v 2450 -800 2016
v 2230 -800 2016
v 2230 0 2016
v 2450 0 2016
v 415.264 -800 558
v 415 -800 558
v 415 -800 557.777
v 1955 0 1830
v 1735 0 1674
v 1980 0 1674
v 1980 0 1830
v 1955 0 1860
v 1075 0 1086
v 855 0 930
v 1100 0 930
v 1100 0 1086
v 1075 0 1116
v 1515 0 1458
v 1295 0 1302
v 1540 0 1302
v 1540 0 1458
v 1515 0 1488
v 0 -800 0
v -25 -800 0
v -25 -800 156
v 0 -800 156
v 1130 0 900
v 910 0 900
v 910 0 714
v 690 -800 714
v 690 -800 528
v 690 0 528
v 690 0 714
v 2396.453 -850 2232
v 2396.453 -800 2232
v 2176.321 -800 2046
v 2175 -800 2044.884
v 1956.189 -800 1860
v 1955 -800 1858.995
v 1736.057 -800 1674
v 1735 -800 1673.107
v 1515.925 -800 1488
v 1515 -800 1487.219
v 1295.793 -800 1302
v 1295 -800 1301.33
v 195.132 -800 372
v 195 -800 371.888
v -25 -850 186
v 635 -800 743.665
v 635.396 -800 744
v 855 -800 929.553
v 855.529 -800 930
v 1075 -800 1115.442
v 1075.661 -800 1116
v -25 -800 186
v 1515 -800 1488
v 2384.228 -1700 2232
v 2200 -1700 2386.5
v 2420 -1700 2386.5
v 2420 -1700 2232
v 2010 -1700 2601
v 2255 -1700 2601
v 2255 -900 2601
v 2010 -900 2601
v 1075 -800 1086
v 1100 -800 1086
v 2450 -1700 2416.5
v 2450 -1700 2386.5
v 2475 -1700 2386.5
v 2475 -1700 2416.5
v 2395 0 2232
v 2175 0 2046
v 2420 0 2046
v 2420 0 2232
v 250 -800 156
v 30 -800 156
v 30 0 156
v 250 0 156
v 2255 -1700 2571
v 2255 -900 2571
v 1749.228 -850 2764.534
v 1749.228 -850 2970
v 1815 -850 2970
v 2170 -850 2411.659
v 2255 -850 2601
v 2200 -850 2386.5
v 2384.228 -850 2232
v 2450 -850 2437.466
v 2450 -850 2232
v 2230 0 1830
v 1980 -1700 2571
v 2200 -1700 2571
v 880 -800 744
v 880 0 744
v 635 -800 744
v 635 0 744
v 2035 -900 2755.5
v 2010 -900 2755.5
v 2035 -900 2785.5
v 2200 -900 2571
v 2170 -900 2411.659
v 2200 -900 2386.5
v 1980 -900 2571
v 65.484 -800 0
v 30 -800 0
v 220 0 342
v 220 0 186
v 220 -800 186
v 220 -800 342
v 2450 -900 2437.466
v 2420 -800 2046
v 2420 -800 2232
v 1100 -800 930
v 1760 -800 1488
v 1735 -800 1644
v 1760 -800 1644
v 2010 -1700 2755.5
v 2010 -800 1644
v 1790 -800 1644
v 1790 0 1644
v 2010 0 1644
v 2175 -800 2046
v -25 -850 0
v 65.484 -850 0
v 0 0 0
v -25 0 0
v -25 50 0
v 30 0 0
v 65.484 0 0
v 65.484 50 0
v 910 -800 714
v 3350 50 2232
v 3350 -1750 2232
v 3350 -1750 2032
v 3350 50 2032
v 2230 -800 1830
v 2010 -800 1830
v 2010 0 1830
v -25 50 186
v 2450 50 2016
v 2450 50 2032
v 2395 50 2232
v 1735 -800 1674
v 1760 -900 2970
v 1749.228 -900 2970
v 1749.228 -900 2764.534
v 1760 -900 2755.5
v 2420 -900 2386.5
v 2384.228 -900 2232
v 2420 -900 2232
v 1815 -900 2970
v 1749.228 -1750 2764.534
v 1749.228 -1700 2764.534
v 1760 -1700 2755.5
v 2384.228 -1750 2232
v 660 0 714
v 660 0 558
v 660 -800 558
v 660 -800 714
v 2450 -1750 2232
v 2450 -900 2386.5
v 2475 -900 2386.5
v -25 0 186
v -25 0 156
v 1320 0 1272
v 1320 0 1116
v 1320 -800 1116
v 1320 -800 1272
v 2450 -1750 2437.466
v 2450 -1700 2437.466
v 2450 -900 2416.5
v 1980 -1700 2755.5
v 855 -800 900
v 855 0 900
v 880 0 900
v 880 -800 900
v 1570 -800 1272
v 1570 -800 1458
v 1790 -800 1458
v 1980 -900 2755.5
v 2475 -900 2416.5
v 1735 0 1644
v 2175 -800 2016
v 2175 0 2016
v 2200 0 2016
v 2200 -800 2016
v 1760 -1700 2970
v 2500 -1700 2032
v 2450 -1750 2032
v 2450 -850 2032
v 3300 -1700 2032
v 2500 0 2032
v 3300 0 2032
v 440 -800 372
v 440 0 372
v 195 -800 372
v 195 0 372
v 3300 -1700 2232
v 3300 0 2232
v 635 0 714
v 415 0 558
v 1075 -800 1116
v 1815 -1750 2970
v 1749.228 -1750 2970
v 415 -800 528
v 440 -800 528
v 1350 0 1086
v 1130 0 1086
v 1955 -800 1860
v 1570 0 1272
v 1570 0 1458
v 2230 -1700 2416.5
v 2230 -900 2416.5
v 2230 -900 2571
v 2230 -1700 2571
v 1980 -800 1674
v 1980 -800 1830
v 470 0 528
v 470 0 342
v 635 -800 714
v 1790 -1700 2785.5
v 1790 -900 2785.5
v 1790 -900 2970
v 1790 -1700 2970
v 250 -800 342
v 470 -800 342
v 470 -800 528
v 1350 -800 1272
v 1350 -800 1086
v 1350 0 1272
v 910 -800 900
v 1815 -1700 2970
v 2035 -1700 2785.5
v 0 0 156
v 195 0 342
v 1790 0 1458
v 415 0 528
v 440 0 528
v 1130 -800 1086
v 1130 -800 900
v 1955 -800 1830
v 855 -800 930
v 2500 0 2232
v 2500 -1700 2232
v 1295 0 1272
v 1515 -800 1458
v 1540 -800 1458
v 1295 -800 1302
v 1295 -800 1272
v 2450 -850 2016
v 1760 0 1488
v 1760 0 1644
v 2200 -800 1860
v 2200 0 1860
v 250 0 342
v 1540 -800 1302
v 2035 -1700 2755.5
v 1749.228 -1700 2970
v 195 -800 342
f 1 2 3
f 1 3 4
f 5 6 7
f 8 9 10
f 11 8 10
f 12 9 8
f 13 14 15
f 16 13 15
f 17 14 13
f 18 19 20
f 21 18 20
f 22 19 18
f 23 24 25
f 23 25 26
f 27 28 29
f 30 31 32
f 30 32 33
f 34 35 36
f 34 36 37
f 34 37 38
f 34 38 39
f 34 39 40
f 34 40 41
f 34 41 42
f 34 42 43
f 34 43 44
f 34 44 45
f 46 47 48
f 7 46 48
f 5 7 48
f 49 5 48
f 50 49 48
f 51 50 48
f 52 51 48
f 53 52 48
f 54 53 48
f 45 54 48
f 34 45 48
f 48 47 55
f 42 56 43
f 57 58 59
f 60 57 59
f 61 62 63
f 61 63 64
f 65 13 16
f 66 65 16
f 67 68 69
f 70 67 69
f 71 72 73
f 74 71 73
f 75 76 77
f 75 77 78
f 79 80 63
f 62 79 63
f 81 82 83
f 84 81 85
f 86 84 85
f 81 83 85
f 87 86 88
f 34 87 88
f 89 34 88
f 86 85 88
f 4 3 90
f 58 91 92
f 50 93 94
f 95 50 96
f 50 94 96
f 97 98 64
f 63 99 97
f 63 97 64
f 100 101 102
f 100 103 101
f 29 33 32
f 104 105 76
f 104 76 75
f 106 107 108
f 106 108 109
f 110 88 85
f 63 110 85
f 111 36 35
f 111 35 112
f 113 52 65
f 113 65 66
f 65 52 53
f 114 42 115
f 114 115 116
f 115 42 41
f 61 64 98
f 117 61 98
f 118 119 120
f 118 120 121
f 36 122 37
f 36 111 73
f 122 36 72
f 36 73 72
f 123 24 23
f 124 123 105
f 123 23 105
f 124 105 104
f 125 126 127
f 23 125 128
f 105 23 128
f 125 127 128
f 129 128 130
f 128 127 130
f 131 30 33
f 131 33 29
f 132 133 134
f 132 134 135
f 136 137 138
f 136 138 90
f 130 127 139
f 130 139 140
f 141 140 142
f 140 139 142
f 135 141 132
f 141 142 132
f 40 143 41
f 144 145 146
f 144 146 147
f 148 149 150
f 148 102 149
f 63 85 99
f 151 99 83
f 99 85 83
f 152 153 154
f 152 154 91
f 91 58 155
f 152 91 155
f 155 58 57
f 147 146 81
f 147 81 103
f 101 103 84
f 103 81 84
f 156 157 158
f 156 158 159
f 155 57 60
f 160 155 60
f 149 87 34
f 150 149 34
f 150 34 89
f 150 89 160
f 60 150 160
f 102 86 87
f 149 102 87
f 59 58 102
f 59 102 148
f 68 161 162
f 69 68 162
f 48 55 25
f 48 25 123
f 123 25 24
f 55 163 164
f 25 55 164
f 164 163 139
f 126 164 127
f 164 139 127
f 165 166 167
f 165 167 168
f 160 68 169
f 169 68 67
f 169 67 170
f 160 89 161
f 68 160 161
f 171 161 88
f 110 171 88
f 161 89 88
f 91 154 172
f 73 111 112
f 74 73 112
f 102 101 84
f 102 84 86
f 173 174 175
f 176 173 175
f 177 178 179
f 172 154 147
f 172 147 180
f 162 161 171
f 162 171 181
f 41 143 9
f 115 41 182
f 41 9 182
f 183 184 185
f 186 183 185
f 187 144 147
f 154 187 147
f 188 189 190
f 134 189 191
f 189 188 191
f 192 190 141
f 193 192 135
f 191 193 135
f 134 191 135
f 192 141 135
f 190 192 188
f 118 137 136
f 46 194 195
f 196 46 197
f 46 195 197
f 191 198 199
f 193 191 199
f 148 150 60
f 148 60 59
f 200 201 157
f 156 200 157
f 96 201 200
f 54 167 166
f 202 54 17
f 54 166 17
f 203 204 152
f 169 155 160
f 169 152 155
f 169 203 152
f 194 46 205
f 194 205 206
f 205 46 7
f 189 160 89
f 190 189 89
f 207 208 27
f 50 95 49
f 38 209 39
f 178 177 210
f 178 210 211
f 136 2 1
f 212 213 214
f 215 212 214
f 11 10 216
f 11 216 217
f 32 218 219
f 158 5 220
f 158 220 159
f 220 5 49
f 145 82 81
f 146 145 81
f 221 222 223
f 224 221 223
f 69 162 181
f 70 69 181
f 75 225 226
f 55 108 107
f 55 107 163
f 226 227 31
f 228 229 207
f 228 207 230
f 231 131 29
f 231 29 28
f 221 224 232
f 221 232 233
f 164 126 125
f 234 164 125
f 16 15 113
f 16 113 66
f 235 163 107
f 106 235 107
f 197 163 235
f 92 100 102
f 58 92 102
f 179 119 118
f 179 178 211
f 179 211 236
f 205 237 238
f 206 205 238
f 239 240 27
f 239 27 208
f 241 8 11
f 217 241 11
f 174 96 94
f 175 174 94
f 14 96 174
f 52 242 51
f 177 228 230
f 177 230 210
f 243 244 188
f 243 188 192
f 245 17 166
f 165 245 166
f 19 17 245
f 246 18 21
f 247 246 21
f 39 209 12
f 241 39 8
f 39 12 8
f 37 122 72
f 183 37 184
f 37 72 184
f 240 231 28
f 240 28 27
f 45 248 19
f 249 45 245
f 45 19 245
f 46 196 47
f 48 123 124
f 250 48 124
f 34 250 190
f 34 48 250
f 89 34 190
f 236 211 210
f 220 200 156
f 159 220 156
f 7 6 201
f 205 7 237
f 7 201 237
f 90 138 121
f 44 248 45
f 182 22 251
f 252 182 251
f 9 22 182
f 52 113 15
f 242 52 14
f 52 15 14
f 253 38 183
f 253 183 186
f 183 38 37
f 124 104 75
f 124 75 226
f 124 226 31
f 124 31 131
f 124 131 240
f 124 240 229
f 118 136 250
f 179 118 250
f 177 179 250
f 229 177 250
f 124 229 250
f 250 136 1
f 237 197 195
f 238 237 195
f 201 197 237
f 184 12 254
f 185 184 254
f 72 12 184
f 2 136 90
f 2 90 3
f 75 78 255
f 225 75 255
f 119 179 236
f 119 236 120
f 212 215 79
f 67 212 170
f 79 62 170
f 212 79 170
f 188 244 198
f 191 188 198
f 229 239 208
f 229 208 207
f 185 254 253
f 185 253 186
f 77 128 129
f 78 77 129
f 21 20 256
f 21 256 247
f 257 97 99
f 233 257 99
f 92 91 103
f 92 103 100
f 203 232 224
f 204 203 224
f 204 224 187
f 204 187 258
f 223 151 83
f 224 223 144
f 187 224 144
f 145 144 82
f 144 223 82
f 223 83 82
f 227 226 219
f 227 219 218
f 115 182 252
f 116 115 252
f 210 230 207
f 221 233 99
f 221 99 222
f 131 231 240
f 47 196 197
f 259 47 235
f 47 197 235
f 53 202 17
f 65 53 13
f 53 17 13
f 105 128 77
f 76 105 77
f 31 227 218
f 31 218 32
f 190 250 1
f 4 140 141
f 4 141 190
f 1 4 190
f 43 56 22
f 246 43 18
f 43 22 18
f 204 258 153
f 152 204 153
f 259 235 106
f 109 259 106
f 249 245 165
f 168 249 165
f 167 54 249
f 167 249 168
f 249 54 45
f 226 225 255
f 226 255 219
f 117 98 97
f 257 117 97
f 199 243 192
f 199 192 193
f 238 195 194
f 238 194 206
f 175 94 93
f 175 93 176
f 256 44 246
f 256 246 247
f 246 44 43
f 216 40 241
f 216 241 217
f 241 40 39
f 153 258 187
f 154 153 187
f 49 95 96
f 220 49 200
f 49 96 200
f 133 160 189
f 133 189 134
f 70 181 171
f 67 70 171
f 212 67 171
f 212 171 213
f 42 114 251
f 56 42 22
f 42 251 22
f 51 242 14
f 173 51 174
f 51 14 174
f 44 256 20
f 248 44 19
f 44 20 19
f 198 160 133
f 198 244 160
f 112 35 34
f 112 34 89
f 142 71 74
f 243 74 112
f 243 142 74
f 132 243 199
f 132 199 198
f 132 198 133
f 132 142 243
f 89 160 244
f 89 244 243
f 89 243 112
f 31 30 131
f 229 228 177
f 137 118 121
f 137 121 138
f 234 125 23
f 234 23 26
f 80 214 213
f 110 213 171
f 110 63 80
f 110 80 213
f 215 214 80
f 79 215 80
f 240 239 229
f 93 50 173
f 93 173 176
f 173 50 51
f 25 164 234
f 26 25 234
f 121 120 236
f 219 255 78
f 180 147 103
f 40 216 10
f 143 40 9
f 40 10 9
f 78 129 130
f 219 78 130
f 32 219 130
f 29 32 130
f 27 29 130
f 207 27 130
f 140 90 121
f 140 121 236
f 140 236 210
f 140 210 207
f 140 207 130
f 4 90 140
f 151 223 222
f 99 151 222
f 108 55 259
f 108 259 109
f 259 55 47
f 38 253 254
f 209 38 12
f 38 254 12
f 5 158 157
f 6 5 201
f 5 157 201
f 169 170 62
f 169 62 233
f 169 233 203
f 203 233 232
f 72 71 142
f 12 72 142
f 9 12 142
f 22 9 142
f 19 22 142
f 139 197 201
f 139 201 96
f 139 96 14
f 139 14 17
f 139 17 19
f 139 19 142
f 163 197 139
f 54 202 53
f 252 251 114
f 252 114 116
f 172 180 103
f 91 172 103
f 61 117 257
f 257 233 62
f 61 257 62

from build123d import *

# Parameters (mm, degrees)
F0_W      = 30
F0_H      = 156
F0_H_2    = 186
F3_DEPTH  = 800
F5_DEPTH  = 800
F6_DEPTH  = 50
F8_DEPTH  = 50
F9_W      = 900
F9_H      = 1800
F9_W_2    = 800
F9_H_2    = 1700
F10_DEPTH = 200
F12_DEPTH = 50
F13_W     = 30
F13_H     = 154.5
F13_H_2   = 184.5
F14_DEPTH = 800
F16_DEPTH = 50


with BuildPart() as f3:
    # F0 (on Front) → F3 (new body)
    with BuildSketch(Plane.XZ):
        with Locations((15, 78)):
            Rectangle(F0_W, F0_H)
        Polygon((-25, 156), (0, 156), (30, 156), (220, 156), (250, 156), (250, 186), (220, 186), (0, 186), (-25, 186), align=None)
        with Locations((235, 264)):
            Rectangle(F0_W, F0_H)
        Polygon((220, 342), (250, 342), (440, 342), (470, 342), (470, 372), (440, 372), (220, 372), (195, 372), (195, 342), align=None)
        with Locations((455, 450)):
            Rectangle(F0_W, F0_H)
        Polygon((440, 528), (470, 528), (660, 528), (690, 528), (690, 558), (660, 558), (440, 558), (415, 558), (415, 528), align=None)
        with Locations((675, 636)):
            Rectangle(F0_W, F0_H)
        Polygon((660, 714), (690, 714), (880, 714), (910, 714), (910, 744), (880, 744), (660, 744), (635, 744), (635, 714), align=None)
        with Locations((895, 822)):
            Rectangle(F0_W, F0_H)
        Polygon((880, 900), (910, 900), (1100, 900), (1130, 900), (1130, 930), (1100, 930), (880, 930), (855, 930), (855, 900), align=None)
        with Locations((1115, 1008)):
            Rectangle(F0_W, F0_H)
        Polygon((1100, 1086), (1130, 1086), (1320, 1086), (1350, 1086), (1350, 1116), (1320, 1116), (1100, 1116), (1075, 1116), (1075, 1086), align=None)
        with Locations((1335, 1194)):
            Rectangle(F0_W, F0_H)
        Polygon((1320, 1272), (1350, 1272), (1540, 1272), (1570, 1272), (1570, 1302), (1540, 1302), (1320, 1302), (1295, 1302), (1295, 1272), align=None)
        with Locations((1555, 1380)):
            Rectangle(F0_W, F0_H)
        Polygon((1540, 1458), (1570, 1458), (1760, 1458), (1790, 1458), (1790, 1488), (1760, 1488), (1540, 1488), (1515, 1488), (1515, 1458), align=None)
        with Locations((1775, 1566)):
            Rectangle(F0_W, F0_H)
        Polygon((1760, 1644), (1790, 1644), (1980, 1644), (2010, 1644), (2010, 1674), (1980, 1674), (1760, 1674), (1735, 1674), (1735, 1644), align=None)
        with Locations((1995, 1752)):
            Rectangle(F0_W, F0_H)
        Polygon((1980, 1830), (2010, 1830), (2200, 1830), (2230, 1830), (2230, 1860), (2200, 1860), (1980, 1860), (1955, 1860), (1955, 1830), align=None)
        with Locations((2215, 1938)):
            Rectangle(F0_W, F0_H)
        Polygon((2200, 2016), (2230, 2016), (2420, 2016), (2450, 2016), (2450, 2046), (2420, 2046), (2200, 2046), (2175, 2046), (2175, 2016), align=None)
        with Locations((2435, 2139)):
            Rectangle(F0_W, F0_H_2)
    extrude(amount=F3_DEPTH)

    # F0 (on Front) → F5 (join)
    with BuildSketch(Plane.XZ):
        with Locations((15, 78)):
            Rectangle(F0_W, F0_H)
        Polygon((-25, 156), (0, 156), (30, 156), (220, 156), (250, 156), (250, 186), (220, 186), (0, 186), (-25, 186), align=None)
        with Locations((235, 264)):
            Rectangle(F0_W, F0_H)
        Polygon((220, 342), (250, 342), (440, 342), (470, 342), (470, 372), (440, 372), (220, 372), (195, 372), (195, 342), align=None)
        with Locations((455, 450)):
            Rectangle(F0_W, F0_H)
        Polygon((440, 528), (470, 528), (660, 528), (690, 528), (690, 558), (660, 558), (440, 558), (415, 558), (415, 528), align=None)
        with Locations((675, 636)):
            Rectangle(F0_W, F0_H)
        Polygon((660, 714), (690, 714), (880, 714), (910, 714), (910, 744), (880, 744), (660, 744), (635, 744), (635, 714), align=None)
        with Locations((895, 822)):
            Rectangle(F0_W, F0_H)
        Polygon((880, 900), (910, 900), (1100, 900), (1130, 900), (1130, 930), (1100, 930), (880, 930), (855, 930), (855, 900), align=None)
        with Locations((1115, 1008)):
            Rectangle(F0_W, F0_H)
        Polygon((1100, 1086), (1130, 1086), (1320, 1086), (1350, 1086), (1350, 1116), (1320, 1116), (1100, 1116), (1075, 1116), (1075, 1086), align=None)
        with Locations((1335, 1194)):
            Rectangle(F0_W, F0_H)
        Polygon((1320, 1272), (1350, 1272), (1540, 1272), (1570, 1272), (1570, 1302), (1540, 1302), (1320, 1302), (1295, 1302), (1295, 1272), align=None)
        with Locations((1555, 1380)):
            Rectangle(F0_W, F0_H)
        Polygon((1540, 1458), (1570, 1458), (1760, 1458), (1790, 1458), (1790, 1488), (1760, 1488), (1540, 1488), (1515, 1488), (1515, 1458), align=None)
        with Locations((1775, 1566)):
            Rectangle(F0_W, F0_H)
        Polygon((1760, 1644), (1790, 1644), (1980, 1644), (2010, 1644), (2010, 1674), (1980, 1674), (1760, 1674), (1735, 1674), (1735, 1644), align=None)
        with Locations((1995, 1752)):
            Rectangle(F0_W, F0_H)
        Polygon((1980, 1830), (2010, 1830), (2200, 1830), (2230, 1830), (2230, 1860), (2200, 1860), (1980, 1860), (1955, 1860), (1955, 1830), align=None)
        with Locations((2215, 1938)):
            Rectangle(F0_W, F0_H)
        Polygon((2200, 2016), (2230, 2016), (2420, 2016), (2450, 2016), (2450, 2046), (2420, 2046), (2200, 2046), (2175, 2046), (2175, 2016), align=None)
        with Locations((2435, 2139)):
            Rectangle(F0_W, F0_H_2)
    extrude(amount=F5_DEPTH)

    # F4 (on Front) → F6 (join)
    with BuildSketch(Plane.XZ):
        Polygon((2395, 2232), (-25, 186), (-25, 0), (65.483871, 0), (2450, 2016), (2450, 2232), align=None)
    extrude(amount=-F6_DEPTH)

    # F7 (on face) → F8 (join)
    with BuildSketch(Plane.XZ.offset(800)):
        Polygon((65.483871, 0), (2450, 2016), (2450, 2232), (2396.453381, 2232), (-25, 186), (-25, 0), align=None)
    extrude(amount=F8_DEPTH)

    # F9 (on face) → F10 (join)
    with BuildSketch(Plane.XY.offset(2232)):
        with Locations((2900, -850)):
            Rectangle(F9_W, F9_H)
        with Locations((2900, -850)):
            Rectangle(F9_W_2, F9_H_2, mode=Mode.SUBTRACT)
    extrude(amount=-F10_DEPTH)



with BuildPart() as f12:
    # F11 (on face) → F12 (new body)
    with BuildSketch(Plane.XZ.offset(850)):
        Polygon((2420, 2232), (2450, 2232), (2450, 2416.5), (2450, 2437.465909), (2255, 2601), (2035, 2785.5), (1815, 2970), (1790, 2970), (1760, 2970), (1749.227642, 2970), (1749.227642, 2764.534091), (2170, 2411.659091), (2200, 2386.5), (2384.227642, 2232), align=None)
    extrude(amount=F12_DEPTH)


with BuildPart() as f3_1:
    add(f3.part)

    add(f12.part)  # F14 merges F12
    # F13 (on face) → F14 (join)
    with BuildSketch(Plane.XZ.offset(900)):
        with Locations((2435, 2309.25)):
            Rectangle(F13_W, F13_H)
        Polygon((2420, 2386.5), (2450, 2386.5), (2475, 2386.5), (2475, 2416.5), (2450, 2416.5), (2230, 2416.5), (2200, 2416.5), (2200, 2386.5), (2230, 2386.5), align=None)
        with Locations((2215, 2493.75)):
            Rectangle(F13_W, F13_H)
        Polygon((2010, 2571), (2200, 2571), (2230, 2571), (2255, 2571), (2255, 2601), (2230, 2601), (2010, 2601), (1980, 2601), (1980, 2571), align=None)
        with Locations((1995, 2678.25)):
            Rectangle(F13_W, F13_H)
        Polygon((1790, 2755.5), (1980, 2755.5), (2010, 2755.5), (2035, 2755.5), (2035, 2785.5), (2010, 2785.5), (1790, 2785.5), (1760, 2785.5), (1760, 2755.5), align=None)
        with Locations((1775, 2877.75)):
            Rectangle(F13_W, F13_H_2)
    extrude(amount=F14_DEPTH)

    # F15 (on face) → F16 (join)
    with BuildSketch(Plane.XZ.offset(1700)):
        Polygon((2384.227642, 2232), (2450, 2232), (2450, 2437.465909), (1815, 2970), (1749.227642, 2970), (1749.227642, 2764.534091), align=None)
    extrude(amount=F16_DEPTH)


solid = f3_1.part
